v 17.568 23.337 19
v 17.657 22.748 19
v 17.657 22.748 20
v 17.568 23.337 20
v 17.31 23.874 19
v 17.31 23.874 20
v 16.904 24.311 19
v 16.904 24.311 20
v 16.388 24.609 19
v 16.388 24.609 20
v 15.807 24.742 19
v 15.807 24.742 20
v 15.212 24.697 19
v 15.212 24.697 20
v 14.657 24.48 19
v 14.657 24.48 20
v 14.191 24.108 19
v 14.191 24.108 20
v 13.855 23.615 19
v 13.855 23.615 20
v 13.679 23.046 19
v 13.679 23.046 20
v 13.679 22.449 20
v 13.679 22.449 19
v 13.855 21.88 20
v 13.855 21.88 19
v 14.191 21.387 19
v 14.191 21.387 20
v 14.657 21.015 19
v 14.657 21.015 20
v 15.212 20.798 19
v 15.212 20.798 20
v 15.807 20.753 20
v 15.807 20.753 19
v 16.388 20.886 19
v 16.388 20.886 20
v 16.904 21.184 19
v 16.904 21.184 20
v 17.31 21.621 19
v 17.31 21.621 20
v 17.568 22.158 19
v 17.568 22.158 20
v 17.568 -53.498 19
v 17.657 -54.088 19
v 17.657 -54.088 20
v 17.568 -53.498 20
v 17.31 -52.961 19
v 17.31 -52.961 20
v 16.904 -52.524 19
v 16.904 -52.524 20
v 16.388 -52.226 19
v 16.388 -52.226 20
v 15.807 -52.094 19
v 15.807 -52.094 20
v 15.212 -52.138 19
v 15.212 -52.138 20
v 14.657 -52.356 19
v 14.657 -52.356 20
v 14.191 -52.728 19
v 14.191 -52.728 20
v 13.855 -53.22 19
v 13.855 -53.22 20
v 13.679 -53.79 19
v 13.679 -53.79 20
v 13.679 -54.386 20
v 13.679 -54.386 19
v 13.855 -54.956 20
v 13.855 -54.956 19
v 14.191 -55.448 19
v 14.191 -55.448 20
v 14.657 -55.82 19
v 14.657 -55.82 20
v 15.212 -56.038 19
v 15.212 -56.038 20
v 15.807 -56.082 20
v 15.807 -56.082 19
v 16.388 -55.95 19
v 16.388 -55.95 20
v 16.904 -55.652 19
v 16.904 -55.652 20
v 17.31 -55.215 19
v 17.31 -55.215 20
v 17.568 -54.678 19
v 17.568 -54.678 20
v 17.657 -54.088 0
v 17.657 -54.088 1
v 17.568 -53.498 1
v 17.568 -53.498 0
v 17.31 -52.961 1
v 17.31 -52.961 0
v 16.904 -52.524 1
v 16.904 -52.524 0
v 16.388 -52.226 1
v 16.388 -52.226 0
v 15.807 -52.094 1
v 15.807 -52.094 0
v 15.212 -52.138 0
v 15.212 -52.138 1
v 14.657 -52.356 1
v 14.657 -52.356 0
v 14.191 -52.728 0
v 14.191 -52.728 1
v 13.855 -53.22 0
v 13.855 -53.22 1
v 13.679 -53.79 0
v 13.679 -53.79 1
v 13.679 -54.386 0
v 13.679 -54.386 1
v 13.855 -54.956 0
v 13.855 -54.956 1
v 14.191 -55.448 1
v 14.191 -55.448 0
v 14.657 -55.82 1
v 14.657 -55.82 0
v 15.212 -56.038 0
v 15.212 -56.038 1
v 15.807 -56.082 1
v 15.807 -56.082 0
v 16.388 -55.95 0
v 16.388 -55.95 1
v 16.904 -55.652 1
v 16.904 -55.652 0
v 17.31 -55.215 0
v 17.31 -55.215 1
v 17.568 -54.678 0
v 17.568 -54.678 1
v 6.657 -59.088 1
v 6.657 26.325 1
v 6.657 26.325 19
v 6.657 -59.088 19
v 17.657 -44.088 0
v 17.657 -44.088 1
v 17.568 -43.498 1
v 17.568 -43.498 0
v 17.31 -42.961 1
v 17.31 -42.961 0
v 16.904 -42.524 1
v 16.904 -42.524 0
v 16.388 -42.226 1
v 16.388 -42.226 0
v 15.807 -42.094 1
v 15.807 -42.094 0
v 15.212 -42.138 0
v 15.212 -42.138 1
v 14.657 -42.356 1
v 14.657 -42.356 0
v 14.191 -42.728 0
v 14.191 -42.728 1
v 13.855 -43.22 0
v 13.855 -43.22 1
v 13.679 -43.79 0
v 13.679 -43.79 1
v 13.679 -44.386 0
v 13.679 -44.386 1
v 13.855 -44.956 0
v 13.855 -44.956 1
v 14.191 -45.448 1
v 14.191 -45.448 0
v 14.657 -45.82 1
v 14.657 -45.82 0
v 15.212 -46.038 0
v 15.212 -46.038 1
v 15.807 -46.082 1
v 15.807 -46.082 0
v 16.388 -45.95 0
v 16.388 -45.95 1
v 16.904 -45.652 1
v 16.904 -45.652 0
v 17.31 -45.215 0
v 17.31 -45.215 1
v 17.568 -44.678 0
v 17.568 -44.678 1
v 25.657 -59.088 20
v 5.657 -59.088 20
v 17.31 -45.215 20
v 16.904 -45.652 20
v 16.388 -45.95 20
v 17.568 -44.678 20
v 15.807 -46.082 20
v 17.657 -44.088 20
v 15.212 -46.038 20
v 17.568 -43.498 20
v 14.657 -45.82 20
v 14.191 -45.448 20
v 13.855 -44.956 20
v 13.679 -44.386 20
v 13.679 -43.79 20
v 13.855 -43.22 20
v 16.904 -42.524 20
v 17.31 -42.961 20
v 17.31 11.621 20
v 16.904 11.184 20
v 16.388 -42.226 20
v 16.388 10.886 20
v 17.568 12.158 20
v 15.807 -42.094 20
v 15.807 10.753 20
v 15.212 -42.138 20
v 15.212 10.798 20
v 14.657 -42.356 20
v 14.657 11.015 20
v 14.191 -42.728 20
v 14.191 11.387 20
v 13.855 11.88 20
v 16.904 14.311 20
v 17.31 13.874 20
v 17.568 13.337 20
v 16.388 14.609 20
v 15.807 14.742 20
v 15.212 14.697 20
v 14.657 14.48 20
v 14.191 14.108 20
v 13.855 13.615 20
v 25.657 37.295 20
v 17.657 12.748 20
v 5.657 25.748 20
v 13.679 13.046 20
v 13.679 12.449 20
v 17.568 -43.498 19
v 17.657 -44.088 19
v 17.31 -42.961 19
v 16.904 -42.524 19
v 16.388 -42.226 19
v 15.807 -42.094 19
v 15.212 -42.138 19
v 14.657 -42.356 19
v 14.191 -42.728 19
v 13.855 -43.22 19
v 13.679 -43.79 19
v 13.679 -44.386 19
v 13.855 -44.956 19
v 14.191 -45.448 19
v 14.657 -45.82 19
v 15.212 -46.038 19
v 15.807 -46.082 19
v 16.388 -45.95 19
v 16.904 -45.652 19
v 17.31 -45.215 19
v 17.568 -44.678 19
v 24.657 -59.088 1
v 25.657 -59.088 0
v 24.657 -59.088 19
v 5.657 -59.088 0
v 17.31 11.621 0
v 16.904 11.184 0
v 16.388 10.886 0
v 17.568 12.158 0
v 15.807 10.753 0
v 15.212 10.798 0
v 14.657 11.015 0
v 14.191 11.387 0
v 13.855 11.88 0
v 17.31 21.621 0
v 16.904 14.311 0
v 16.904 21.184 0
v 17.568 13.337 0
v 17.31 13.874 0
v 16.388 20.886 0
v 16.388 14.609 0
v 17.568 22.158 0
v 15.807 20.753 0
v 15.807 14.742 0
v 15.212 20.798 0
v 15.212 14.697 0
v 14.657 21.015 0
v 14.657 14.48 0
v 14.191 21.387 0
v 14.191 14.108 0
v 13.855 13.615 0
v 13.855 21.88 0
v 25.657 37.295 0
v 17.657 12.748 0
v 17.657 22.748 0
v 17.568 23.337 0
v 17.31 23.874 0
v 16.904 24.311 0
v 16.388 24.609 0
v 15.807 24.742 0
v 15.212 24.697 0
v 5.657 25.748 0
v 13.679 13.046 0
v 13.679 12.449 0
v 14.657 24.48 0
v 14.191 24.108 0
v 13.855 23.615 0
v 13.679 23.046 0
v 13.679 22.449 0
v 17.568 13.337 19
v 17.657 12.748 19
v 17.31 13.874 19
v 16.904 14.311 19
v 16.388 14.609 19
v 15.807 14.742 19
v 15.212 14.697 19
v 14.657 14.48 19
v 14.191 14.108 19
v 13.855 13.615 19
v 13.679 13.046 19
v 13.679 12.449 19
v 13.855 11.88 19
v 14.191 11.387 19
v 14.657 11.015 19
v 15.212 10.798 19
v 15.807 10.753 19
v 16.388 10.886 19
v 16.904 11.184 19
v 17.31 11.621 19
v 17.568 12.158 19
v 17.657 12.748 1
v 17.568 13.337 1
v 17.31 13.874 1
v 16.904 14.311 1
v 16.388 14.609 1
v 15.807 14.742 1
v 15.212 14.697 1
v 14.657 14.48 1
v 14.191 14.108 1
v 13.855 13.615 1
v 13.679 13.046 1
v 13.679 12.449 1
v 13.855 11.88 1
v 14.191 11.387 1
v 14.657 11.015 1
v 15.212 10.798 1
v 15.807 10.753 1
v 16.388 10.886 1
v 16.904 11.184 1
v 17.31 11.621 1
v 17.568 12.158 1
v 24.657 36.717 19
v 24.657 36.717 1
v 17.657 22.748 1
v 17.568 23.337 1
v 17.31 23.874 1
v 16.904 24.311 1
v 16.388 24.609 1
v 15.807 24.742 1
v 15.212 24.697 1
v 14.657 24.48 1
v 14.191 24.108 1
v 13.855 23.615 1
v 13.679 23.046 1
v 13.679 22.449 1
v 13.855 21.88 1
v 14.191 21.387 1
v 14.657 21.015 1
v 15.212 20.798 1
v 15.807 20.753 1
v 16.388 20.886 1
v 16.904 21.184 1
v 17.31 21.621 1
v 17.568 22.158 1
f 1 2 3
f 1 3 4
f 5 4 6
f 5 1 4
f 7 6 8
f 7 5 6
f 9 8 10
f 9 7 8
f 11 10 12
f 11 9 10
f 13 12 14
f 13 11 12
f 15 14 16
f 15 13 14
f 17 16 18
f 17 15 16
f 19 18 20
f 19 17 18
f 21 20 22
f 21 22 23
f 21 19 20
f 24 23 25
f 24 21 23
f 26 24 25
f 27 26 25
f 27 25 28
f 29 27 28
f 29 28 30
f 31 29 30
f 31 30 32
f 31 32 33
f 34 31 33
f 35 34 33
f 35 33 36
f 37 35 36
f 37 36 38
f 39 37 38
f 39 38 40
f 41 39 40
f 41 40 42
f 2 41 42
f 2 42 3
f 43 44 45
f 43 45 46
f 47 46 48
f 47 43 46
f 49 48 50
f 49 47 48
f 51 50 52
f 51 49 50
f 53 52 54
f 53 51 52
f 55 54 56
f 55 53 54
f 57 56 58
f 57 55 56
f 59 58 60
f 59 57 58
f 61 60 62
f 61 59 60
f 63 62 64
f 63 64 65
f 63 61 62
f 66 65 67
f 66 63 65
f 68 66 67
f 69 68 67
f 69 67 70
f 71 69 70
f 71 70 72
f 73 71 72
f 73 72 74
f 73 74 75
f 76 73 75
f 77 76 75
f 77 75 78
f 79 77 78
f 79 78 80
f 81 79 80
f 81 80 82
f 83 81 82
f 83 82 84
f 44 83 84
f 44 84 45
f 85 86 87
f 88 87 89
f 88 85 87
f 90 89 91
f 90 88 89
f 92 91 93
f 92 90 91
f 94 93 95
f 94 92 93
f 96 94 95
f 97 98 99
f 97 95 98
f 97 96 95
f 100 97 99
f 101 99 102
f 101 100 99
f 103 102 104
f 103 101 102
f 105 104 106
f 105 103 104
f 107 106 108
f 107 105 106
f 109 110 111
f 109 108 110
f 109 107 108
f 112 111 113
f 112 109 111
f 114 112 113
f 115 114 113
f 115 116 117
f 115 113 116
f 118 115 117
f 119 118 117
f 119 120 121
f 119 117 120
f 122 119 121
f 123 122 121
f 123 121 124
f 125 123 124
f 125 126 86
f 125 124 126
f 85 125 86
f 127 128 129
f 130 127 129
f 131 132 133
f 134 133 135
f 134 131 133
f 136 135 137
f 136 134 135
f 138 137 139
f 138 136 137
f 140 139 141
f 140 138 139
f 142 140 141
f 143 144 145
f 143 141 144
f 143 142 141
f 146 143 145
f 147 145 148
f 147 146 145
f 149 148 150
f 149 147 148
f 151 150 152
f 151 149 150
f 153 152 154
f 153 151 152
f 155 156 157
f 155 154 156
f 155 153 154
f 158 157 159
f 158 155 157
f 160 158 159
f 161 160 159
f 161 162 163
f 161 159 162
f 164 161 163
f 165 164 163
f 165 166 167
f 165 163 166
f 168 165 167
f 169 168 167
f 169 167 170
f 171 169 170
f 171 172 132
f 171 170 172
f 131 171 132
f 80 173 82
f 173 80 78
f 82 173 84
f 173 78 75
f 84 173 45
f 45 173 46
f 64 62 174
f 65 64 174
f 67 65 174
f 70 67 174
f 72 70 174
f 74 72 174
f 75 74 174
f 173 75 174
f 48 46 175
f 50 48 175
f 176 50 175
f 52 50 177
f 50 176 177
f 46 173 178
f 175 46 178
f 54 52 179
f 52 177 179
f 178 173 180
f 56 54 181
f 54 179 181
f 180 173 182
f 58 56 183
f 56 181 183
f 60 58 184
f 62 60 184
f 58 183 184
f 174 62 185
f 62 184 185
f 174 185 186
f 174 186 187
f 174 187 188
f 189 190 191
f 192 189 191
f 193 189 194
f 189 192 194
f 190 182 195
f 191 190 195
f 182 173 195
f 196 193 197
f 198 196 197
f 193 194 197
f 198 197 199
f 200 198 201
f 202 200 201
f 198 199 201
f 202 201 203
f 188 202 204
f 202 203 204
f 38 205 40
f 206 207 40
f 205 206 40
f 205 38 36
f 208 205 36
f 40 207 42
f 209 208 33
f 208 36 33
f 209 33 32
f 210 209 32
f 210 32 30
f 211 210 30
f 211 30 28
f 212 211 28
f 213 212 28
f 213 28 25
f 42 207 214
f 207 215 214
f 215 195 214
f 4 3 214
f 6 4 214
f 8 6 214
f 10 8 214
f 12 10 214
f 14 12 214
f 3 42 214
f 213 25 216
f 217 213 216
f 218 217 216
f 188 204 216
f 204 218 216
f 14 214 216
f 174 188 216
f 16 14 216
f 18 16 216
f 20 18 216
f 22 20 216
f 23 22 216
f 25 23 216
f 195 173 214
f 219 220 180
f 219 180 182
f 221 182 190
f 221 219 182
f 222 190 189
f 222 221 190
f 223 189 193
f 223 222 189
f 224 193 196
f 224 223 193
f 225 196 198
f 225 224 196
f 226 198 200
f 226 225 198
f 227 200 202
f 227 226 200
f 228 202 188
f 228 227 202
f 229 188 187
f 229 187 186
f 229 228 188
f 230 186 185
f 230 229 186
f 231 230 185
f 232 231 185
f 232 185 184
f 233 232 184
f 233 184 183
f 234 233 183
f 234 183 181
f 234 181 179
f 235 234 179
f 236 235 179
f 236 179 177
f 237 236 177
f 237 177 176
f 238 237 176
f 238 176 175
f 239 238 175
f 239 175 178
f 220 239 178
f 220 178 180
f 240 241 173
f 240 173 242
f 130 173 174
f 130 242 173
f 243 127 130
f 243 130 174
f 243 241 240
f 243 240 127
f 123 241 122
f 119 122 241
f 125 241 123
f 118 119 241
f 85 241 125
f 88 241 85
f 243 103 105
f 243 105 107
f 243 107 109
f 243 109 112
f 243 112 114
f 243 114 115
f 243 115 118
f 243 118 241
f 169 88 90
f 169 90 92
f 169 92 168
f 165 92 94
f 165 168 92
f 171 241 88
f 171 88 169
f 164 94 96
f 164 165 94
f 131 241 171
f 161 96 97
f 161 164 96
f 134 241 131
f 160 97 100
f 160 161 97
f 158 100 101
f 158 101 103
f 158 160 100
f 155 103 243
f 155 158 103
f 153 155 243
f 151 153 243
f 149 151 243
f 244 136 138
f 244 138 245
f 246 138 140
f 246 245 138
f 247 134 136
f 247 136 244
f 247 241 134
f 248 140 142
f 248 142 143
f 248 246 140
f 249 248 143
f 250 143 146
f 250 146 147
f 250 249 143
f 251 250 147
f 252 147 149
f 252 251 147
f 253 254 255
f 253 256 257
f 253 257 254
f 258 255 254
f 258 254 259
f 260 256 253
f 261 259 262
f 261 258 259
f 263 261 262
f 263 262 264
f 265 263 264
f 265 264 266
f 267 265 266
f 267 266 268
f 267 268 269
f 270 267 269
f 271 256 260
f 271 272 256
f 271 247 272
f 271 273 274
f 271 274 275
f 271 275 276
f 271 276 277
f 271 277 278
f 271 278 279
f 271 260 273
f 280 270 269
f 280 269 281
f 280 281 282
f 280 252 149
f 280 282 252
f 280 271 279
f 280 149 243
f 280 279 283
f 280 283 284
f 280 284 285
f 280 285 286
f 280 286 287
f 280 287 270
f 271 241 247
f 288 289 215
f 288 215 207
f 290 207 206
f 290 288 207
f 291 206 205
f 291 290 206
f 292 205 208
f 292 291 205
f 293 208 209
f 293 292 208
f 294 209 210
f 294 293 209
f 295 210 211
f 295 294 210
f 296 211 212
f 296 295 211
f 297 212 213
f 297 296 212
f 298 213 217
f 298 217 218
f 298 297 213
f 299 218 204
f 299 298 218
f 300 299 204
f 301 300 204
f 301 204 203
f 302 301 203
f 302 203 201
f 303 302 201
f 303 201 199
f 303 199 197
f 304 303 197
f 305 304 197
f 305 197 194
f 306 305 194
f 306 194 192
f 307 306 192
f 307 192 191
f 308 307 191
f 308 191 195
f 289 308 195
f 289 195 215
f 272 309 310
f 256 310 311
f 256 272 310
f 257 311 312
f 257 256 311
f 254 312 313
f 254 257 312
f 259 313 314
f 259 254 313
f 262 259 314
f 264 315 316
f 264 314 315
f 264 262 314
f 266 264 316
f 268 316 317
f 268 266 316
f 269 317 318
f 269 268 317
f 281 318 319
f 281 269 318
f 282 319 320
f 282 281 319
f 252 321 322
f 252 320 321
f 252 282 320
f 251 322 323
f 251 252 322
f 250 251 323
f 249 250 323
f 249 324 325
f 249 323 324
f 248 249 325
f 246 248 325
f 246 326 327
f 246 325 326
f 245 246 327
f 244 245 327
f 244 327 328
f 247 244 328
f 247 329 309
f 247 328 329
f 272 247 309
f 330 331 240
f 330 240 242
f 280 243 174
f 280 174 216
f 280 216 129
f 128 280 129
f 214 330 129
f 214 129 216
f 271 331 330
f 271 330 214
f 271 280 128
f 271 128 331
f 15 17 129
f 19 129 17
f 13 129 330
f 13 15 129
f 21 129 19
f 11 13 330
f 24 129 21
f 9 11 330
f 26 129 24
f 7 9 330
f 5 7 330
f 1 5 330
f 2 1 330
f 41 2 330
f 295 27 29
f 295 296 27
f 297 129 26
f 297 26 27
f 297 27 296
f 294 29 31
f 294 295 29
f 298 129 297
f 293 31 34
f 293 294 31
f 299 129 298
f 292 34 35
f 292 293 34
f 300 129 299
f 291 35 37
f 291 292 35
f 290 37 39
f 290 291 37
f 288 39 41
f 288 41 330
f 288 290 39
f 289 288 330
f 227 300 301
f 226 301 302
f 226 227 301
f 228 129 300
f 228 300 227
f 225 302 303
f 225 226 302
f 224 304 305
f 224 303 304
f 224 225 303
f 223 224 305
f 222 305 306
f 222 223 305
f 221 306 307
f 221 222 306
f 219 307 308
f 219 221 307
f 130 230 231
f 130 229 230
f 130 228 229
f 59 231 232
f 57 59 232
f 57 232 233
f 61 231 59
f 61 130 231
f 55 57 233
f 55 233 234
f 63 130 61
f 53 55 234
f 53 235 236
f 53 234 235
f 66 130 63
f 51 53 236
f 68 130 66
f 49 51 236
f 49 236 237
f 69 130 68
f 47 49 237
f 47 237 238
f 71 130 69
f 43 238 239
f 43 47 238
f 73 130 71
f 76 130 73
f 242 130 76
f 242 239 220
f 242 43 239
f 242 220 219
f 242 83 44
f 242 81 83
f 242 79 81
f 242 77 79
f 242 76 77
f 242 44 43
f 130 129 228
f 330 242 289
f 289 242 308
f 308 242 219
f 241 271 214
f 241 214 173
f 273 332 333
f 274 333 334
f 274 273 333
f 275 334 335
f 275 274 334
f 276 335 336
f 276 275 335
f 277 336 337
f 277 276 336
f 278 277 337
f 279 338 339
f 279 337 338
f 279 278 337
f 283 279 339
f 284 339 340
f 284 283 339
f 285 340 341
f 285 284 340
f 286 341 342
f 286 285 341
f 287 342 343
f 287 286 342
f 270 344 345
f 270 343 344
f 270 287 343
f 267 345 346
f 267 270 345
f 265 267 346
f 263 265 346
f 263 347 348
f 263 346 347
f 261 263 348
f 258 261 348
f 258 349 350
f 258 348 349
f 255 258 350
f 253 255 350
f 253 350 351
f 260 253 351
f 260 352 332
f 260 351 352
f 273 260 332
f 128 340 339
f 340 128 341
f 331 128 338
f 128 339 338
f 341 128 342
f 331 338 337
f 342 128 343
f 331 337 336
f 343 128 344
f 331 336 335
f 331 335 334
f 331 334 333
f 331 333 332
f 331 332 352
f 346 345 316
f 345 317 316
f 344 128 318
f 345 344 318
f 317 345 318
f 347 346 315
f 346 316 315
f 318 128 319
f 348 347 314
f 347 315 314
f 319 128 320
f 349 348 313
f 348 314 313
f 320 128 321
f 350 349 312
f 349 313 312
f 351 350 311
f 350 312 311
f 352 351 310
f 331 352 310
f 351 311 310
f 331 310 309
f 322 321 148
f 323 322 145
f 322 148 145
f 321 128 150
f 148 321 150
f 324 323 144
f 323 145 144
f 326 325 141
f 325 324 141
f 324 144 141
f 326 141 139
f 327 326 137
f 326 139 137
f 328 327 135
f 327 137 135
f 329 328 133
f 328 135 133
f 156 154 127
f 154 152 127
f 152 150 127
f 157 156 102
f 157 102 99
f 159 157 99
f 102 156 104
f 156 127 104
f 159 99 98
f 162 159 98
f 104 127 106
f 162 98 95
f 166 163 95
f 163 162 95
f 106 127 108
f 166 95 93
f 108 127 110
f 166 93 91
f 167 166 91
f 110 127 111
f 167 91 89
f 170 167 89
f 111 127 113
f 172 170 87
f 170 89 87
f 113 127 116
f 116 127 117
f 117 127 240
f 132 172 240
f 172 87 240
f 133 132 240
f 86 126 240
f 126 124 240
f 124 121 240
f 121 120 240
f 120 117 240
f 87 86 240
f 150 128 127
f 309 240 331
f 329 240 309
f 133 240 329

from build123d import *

# Parameters (mm, degrees)
SKETCH_1_R          = 2
EXTRUDE_1_DEPTH     = 20
SKETCH_2_W          = 18
SKETCH_2_H          = 18
CUT_EXTRUDE_1_DEPTH = 102.724540869


with BuildPart() as part:
    # 草图1 → 凸台-拉伸1 (new body)
    with BuildSketch(Plane.XY):
        Polygon((5.657098919, 25.747533472), (25.657098919, 37.294538856), (25.657098919, -59.088008787), (5.657098919, -59.088008787), align=None)
        with Locations((15.657098919, 22.747533472)):
            Circle(SKETCH_1_R, mode=Mode.SUBTRACT)
        with Locations((15.657098919, 12.747533472)):
            Circle(SKETCH_1_R, mode=Mode.SUBTRACT)
        with Locations((15.657098919, -44.088008787)):
            Circle(SKETCH_1_R, mode=Mode.SUBTRACT)
        with Locations((15.657098919, -54.088008787)):
            Circle(SKETCH_1_R, mode=Mode.SUBTRACT)
    extrude(amount=EXTRUDE_1_DEPTH)

    # 草图2 → 切除-拉伸1 (cut, through all)
    with BuildSketch(Plane.XZ.offset(59.088008787)):
        with Locations((15.657098919, 10)):
            Rectangle(SKETCH_2_W, SKETCH_2_H)
    extrude(amount=-CUT_EXTRUDE_1_DEPTH, mode=Mode.SUBTRACT)


solid = part.part
